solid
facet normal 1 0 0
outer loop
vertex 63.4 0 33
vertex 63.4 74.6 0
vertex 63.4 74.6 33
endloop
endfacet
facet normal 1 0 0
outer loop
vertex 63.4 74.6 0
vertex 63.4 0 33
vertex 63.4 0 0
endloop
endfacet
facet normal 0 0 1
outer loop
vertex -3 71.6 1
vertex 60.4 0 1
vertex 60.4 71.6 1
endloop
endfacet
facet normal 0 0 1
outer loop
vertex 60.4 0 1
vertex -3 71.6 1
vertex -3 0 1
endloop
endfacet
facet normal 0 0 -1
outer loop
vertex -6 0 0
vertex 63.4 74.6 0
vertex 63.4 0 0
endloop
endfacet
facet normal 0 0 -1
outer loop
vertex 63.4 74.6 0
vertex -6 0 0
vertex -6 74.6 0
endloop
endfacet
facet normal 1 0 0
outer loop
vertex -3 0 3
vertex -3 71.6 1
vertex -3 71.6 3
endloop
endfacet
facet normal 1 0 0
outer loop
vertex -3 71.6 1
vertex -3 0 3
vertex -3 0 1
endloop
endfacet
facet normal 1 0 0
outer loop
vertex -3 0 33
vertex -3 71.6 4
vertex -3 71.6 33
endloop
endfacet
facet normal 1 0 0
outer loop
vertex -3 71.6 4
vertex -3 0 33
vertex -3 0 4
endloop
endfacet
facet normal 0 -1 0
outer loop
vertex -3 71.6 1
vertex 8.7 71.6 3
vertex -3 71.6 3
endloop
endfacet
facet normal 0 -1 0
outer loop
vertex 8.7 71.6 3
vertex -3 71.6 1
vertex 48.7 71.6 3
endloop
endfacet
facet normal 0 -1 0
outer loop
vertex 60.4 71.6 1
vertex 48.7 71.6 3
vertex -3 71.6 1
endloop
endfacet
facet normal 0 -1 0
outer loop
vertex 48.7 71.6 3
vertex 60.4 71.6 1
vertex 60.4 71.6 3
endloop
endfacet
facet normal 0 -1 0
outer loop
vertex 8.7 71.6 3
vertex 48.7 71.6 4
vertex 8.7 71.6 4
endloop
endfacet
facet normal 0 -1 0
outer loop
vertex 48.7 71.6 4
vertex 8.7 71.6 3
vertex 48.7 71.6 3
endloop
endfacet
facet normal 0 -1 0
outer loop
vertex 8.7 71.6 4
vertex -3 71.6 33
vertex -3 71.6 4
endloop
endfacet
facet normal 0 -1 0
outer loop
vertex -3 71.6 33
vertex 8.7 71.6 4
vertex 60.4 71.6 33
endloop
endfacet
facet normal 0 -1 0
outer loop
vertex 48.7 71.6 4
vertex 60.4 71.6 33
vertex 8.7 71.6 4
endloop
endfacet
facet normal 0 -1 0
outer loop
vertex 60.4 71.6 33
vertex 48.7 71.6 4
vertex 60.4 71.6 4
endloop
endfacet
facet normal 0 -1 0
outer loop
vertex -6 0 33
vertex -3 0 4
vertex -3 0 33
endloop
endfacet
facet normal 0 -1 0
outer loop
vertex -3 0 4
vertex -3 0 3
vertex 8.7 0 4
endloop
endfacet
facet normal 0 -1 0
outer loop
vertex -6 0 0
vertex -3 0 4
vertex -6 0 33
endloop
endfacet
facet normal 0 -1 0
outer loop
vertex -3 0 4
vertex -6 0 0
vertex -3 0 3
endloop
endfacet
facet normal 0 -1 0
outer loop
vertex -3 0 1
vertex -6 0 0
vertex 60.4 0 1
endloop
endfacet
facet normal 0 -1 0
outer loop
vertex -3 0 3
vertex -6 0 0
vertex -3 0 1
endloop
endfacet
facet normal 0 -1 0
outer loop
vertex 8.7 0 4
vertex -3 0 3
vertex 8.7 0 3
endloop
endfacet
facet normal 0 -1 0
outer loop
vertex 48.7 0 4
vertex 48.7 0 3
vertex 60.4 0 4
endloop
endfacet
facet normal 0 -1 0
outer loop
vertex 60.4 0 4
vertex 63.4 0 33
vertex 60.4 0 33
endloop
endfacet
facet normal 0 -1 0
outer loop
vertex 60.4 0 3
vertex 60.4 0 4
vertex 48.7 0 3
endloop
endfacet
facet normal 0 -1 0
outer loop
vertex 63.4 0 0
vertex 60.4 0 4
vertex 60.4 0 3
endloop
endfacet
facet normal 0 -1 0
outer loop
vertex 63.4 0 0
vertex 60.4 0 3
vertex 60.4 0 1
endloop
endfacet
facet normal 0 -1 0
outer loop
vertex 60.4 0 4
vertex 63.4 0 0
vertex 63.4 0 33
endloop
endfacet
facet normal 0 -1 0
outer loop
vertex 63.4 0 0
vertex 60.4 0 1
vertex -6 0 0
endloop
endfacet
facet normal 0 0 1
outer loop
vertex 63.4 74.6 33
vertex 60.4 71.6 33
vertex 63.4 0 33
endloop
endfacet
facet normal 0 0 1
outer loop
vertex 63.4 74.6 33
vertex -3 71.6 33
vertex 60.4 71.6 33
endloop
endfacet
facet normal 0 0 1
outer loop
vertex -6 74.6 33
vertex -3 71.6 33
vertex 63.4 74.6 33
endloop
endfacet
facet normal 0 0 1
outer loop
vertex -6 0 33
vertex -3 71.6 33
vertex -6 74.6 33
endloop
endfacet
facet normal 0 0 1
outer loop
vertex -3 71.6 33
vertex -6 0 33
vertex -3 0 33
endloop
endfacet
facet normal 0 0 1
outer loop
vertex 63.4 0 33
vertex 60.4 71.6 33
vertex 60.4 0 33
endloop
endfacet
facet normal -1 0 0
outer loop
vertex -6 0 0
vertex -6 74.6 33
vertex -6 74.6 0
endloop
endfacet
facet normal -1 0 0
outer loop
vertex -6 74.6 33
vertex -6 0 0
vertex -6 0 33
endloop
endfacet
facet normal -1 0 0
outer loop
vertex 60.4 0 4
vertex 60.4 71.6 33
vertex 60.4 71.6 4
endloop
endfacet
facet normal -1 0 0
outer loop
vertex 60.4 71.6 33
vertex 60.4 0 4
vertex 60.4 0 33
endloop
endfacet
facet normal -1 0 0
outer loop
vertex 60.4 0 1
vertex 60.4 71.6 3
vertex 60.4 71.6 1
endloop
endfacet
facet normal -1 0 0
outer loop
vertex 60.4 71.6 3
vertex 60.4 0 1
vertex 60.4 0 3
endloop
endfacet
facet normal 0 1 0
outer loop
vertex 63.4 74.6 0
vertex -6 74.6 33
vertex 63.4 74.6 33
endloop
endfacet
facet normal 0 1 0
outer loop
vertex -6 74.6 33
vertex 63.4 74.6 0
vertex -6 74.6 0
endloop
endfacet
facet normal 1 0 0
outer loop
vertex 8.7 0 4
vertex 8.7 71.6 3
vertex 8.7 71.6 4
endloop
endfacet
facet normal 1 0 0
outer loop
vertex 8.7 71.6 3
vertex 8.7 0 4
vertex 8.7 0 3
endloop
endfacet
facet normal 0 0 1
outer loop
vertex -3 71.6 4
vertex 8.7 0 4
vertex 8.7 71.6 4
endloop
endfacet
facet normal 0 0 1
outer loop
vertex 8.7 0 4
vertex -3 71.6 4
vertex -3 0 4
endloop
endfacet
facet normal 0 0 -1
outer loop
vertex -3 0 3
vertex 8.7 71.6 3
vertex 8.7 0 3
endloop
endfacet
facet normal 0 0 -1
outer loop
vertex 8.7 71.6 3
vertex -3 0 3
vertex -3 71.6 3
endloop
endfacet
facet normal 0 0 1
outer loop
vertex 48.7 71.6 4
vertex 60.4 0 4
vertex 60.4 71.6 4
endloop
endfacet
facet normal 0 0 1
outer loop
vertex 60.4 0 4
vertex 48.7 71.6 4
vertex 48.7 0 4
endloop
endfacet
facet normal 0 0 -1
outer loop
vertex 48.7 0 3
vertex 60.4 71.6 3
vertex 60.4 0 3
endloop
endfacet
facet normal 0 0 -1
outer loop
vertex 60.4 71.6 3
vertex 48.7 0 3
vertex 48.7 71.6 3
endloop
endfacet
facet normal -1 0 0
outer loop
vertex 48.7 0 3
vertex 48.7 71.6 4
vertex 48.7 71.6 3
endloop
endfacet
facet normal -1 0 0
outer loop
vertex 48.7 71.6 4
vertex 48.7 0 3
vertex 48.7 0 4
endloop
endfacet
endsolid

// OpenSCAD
// file: controller_case_common.scad
// defines common functionality for the controller case for the RGB lamp

floor_thickness = 1.0;
arduino_width = 54.4;
arduino_length = 68.6;
wall_thickness = 3.0;
// main file
// forms the top of the controller case, which simply slides over the bottom part and has ridges into which
// one can slide the transistor panel
// note that the model is made as if it's lying down, with the assumption that it will be rotated in one's slicer program

include <controller_case_common.scad>;

perfboard_thickness = 5.0; // provide room for solder
height = 33.0;
groove_depth = 3.0;
perfboard_width = 43.0;
interior_width = arduino_width + (wall_thickness * 2);
groove_shelf_width = ((interior_width - perfboard_width)/2) + groove_depth;

module groove_base() {
  cube([groove_shelf_width, arduino_length + wall_thickness, floor_thickness]);
}


// the roof of the box
translate([(-wall_thickness), 0, 0])
  cube([arduino_width + (wall_thickness * 4), arduino_length + wall_thickness, floor_thickness]);

// the walls
translate([(-wall_thickness * 2), 0, 0,]) 
  cube([wall_thickness, arduino_length + wall_thickness, height]);

translate([arduino_width + (wall_thickness * 2), 0, 0])
  cube([wall_thickness, arduino_length + wall_thickness, height]);


// the back
translate([-wall_thickness * 2, arduino_length + wall_thickness, 0])
  cube([arduino_width + (wall_thickness * 5), wall_thickness, height]);

// grooves for perfboard
translate([-wall_thickness, 0, groove_depth]) groove_base();

translate([interior_width - groove_shelf_width, 0, groove_depth]) groove_base();
